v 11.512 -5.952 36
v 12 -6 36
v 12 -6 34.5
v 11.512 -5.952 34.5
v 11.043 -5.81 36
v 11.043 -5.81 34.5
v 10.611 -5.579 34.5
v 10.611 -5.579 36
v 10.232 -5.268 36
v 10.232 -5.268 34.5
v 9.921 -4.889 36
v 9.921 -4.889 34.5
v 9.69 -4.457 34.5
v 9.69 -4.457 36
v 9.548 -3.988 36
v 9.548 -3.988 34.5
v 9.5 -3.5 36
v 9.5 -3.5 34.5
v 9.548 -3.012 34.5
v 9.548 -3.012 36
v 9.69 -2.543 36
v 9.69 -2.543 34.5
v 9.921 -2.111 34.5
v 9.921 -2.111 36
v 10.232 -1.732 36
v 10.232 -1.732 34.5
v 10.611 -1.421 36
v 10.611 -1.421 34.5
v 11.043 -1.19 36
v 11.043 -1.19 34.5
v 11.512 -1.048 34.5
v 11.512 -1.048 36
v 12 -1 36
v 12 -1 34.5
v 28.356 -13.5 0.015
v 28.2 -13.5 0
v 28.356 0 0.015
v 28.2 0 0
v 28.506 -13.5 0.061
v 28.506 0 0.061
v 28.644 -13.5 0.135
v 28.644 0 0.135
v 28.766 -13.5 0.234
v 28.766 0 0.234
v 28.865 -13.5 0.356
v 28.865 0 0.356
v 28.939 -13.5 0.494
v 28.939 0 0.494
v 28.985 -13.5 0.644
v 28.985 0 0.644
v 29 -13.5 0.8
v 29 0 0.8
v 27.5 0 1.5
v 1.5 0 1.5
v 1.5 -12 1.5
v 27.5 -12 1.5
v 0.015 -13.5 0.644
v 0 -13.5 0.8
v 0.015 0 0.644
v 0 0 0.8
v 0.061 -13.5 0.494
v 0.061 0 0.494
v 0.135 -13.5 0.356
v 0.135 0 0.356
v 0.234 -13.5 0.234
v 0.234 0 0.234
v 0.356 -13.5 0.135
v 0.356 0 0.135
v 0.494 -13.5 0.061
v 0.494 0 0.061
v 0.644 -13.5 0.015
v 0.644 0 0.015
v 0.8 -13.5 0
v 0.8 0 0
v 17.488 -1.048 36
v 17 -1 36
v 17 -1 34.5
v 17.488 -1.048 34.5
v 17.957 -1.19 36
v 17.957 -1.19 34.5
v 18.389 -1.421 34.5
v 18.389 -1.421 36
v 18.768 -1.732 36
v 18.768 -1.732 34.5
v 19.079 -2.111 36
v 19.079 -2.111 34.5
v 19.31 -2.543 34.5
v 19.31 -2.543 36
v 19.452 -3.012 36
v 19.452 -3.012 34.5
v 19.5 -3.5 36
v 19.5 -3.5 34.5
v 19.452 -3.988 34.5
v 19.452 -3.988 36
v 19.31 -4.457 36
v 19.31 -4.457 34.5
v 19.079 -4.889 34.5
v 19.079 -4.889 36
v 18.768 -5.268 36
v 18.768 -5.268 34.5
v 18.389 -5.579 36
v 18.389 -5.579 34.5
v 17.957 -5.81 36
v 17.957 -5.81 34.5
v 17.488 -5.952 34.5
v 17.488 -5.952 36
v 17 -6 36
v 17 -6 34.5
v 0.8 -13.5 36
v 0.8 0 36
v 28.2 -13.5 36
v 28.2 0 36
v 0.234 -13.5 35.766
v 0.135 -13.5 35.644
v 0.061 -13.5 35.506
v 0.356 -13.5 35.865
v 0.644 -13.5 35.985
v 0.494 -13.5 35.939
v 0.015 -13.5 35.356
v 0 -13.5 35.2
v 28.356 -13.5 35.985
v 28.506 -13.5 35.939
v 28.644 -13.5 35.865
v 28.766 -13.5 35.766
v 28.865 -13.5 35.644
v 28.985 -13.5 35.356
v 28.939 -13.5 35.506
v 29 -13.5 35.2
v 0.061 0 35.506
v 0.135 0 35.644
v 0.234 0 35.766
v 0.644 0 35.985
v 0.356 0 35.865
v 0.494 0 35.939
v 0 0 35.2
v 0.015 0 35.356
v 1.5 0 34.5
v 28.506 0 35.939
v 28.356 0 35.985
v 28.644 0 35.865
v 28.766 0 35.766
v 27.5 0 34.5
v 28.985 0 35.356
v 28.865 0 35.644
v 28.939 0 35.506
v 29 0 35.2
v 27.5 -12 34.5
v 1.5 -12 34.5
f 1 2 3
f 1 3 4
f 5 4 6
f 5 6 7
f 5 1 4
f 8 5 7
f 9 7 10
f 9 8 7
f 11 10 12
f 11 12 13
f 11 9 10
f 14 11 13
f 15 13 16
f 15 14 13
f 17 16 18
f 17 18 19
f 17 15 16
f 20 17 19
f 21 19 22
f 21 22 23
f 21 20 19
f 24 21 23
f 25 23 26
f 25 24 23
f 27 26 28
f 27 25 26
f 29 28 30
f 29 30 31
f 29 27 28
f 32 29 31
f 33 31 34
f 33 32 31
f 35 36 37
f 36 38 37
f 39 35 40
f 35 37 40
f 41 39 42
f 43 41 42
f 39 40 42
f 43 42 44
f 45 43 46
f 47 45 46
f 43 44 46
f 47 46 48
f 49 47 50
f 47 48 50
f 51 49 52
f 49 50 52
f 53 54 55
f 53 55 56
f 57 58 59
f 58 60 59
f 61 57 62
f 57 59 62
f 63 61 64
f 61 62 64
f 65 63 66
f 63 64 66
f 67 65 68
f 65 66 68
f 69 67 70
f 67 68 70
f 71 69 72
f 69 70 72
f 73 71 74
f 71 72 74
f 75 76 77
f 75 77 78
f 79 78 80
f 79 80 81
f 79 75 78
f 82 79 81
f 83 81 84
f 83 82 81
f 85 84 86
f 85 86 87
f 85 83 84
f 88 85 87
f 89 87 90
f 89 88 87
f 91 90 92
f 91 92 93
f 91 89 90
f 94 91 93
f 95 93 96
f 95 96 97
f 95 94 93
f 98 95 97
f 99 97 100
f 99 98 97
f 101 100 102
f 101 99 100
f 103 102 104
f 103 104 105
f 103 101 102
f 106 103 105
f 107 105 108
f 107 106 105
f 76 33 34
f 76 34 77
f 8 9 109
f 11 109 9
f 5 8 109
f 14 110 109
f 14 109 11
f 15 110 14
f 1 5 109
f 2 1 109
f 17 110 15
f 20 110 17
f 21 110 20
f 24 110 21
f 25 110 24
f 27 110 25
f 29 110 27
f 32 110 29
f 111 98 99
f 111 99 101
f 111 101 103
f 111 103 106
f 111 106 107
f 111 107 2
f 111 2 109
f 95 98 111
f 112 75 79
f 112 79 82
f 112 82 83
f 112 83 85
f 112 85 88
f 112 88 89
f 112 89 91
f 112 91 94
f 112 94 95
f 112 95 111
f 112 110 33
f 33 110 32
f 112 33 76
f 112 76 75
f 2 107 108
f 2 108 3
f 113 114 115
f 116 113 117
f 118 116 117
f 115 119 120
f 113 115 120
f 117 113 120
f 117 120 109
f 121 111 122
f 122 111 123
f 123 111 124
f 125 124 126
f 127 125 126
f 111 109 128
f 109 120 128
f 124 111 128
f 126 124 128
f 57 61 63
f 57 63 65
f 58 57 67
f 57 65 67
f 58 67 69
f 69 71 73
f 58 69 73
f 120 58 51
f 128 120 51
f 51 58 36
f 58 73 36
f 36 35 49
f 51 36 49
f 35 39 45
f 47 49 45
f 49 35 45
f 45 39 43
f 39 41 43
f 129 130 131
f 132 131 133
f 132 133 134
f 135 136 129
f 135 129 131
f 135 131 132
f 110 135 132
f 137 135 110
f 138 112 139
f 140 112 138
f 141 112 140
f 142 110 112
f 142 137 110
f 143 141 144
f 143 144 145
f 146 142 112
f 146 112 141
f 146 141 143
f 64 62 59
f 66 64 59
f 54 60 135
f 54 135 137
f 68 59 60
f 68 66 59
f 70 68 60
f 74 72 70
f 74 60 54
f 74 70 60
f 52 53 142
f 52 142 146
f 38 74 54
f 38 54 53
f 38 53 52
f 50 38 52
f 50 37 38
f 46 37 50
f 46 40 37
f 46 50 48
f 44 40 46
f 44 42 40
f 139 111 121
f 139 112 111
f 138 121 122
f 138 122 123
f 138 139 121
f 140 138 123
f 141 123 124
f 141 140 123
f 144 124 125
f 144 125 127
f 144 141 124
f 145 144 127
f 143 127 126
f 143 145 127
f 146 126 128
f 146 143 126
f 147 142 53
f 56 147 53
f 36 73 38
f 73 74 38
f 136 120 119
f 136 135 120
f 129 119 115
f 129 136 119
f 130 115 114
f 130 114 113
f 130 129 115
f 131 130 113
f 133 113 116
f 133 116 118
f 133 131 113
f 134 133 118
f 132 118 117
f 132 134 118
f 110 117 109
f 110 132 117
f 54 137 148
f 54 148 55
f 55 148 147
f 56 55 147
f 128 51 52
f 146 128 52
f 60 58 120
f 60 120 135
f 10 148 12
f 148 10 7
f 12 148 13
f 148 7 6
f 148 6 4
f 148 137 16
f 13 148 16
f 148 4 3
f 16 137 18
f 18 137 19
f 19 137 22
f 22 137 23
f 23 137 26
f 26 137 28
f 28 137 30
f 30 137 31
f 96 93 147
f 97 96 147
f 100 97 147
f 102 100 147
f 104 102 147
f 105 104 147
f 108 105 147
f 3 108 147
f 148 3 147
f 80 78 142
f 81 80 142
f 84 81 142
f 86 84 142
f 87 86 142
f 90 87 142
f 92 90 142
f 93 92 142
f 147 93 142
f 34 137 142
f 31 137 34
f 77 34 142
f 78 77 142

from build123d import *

# Parameters (mm, degrees)
SKETCH1_W           = 29
SKETCH1_H           = 13.5
BOSS_EXTRUDE1_DEPTH = 36
SKETCH2_W           = 26
SKETCH2_H           = 33
CUT_EXTRUDE1_DEPTH  = 12
CUT_EXTRUDE2_DEPTH  = 1.5
FILLET1_R           = 0.8


with BuildPart() as part:
    # Sketch1 → Boss-Extrude1 (new body)
    with BuildSketch(Plane.XY):
        with Locations((14.5, -6.75)):
            Rectangle(SKETCH1_W, SKETCH1_H)
    extrude(amount=BOSS_EXTRUDE1_DEPTH)

    # Sketch2 → Cut-Extrude1 (cut)
    with BuildSketch(Plane(origin=(0, 0, 0), x_dir=(1, 0, 0), z_dir=(0, 1, 0))):
        with Locations((14.5, -18)):
            Rectangle(SKETCH2_W, SKETCH2_H)
    extrude(amount=-CUT_EXTRUDE1_DEPTH, mode=Mode.SUBTRACT)

    # Sketch3 → Cut-Extrude2 (cut)
    with BuildSketch(Plane.XY.offset(36)):
        with BuildLine():
            Line((12, -1), (17, -1))
            ThreePointArc((17, -1), (19.5, -3.5), (17, -6))
            Line((17, -6), (12, -6))
            ThreePointArc((12, -6), (9.5, -3.5), (12, -1))
        make_face()
    extrude(amount=-CUT_EXTRUDE2_DEPTH, mode=Mode.SUBTRACT)

    # Fillet1
    fillet1_edges = [part.edges().sort_by_distance(p)[0] for p in [
        (29, -6.75, 36),
        (0, -6.75, 36),
        (29, -6.75, 0),
        (0, -6.75, 0),
    ]]
    fillet(fillet1_edges, radius=FILLET1_R)


solid = part.part
